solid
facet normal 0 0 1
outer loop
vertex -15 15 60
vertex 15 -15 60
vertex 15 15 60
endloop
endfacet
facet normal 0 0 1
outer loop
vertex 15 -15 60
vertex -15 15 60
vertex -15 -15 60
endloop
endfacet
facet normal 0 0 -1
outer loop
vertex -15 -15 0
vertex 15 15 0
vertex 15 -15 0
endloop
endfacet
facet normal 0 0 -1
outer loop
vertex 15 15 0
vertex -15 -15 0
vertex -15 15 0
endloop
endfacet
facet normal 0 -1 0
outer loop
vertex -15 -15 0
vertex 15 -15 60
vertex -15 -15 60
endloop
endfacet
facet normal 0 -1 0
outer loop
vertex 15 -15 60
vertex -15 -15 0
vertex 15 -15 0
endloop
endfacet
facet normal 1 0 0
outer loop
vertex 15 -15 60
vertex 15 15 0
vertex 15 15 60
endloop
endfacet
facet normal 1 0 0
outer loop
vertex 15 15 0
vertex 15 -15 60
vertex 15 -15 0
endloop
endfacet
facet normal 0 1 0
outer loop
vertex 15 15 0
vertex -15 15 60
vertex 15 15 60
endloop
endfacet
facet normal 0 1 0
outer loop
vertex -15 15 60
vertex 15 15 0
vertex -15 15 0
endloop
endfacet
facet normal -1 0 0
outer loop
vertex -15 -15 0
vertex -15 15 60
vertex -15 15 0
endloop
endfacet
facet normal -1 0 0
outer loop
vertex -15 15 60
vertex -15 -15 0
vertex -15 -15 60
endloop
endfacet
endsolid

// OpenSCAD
difference(){
    translate([0,0,30]) cube([30,30,60],center=true);

}
